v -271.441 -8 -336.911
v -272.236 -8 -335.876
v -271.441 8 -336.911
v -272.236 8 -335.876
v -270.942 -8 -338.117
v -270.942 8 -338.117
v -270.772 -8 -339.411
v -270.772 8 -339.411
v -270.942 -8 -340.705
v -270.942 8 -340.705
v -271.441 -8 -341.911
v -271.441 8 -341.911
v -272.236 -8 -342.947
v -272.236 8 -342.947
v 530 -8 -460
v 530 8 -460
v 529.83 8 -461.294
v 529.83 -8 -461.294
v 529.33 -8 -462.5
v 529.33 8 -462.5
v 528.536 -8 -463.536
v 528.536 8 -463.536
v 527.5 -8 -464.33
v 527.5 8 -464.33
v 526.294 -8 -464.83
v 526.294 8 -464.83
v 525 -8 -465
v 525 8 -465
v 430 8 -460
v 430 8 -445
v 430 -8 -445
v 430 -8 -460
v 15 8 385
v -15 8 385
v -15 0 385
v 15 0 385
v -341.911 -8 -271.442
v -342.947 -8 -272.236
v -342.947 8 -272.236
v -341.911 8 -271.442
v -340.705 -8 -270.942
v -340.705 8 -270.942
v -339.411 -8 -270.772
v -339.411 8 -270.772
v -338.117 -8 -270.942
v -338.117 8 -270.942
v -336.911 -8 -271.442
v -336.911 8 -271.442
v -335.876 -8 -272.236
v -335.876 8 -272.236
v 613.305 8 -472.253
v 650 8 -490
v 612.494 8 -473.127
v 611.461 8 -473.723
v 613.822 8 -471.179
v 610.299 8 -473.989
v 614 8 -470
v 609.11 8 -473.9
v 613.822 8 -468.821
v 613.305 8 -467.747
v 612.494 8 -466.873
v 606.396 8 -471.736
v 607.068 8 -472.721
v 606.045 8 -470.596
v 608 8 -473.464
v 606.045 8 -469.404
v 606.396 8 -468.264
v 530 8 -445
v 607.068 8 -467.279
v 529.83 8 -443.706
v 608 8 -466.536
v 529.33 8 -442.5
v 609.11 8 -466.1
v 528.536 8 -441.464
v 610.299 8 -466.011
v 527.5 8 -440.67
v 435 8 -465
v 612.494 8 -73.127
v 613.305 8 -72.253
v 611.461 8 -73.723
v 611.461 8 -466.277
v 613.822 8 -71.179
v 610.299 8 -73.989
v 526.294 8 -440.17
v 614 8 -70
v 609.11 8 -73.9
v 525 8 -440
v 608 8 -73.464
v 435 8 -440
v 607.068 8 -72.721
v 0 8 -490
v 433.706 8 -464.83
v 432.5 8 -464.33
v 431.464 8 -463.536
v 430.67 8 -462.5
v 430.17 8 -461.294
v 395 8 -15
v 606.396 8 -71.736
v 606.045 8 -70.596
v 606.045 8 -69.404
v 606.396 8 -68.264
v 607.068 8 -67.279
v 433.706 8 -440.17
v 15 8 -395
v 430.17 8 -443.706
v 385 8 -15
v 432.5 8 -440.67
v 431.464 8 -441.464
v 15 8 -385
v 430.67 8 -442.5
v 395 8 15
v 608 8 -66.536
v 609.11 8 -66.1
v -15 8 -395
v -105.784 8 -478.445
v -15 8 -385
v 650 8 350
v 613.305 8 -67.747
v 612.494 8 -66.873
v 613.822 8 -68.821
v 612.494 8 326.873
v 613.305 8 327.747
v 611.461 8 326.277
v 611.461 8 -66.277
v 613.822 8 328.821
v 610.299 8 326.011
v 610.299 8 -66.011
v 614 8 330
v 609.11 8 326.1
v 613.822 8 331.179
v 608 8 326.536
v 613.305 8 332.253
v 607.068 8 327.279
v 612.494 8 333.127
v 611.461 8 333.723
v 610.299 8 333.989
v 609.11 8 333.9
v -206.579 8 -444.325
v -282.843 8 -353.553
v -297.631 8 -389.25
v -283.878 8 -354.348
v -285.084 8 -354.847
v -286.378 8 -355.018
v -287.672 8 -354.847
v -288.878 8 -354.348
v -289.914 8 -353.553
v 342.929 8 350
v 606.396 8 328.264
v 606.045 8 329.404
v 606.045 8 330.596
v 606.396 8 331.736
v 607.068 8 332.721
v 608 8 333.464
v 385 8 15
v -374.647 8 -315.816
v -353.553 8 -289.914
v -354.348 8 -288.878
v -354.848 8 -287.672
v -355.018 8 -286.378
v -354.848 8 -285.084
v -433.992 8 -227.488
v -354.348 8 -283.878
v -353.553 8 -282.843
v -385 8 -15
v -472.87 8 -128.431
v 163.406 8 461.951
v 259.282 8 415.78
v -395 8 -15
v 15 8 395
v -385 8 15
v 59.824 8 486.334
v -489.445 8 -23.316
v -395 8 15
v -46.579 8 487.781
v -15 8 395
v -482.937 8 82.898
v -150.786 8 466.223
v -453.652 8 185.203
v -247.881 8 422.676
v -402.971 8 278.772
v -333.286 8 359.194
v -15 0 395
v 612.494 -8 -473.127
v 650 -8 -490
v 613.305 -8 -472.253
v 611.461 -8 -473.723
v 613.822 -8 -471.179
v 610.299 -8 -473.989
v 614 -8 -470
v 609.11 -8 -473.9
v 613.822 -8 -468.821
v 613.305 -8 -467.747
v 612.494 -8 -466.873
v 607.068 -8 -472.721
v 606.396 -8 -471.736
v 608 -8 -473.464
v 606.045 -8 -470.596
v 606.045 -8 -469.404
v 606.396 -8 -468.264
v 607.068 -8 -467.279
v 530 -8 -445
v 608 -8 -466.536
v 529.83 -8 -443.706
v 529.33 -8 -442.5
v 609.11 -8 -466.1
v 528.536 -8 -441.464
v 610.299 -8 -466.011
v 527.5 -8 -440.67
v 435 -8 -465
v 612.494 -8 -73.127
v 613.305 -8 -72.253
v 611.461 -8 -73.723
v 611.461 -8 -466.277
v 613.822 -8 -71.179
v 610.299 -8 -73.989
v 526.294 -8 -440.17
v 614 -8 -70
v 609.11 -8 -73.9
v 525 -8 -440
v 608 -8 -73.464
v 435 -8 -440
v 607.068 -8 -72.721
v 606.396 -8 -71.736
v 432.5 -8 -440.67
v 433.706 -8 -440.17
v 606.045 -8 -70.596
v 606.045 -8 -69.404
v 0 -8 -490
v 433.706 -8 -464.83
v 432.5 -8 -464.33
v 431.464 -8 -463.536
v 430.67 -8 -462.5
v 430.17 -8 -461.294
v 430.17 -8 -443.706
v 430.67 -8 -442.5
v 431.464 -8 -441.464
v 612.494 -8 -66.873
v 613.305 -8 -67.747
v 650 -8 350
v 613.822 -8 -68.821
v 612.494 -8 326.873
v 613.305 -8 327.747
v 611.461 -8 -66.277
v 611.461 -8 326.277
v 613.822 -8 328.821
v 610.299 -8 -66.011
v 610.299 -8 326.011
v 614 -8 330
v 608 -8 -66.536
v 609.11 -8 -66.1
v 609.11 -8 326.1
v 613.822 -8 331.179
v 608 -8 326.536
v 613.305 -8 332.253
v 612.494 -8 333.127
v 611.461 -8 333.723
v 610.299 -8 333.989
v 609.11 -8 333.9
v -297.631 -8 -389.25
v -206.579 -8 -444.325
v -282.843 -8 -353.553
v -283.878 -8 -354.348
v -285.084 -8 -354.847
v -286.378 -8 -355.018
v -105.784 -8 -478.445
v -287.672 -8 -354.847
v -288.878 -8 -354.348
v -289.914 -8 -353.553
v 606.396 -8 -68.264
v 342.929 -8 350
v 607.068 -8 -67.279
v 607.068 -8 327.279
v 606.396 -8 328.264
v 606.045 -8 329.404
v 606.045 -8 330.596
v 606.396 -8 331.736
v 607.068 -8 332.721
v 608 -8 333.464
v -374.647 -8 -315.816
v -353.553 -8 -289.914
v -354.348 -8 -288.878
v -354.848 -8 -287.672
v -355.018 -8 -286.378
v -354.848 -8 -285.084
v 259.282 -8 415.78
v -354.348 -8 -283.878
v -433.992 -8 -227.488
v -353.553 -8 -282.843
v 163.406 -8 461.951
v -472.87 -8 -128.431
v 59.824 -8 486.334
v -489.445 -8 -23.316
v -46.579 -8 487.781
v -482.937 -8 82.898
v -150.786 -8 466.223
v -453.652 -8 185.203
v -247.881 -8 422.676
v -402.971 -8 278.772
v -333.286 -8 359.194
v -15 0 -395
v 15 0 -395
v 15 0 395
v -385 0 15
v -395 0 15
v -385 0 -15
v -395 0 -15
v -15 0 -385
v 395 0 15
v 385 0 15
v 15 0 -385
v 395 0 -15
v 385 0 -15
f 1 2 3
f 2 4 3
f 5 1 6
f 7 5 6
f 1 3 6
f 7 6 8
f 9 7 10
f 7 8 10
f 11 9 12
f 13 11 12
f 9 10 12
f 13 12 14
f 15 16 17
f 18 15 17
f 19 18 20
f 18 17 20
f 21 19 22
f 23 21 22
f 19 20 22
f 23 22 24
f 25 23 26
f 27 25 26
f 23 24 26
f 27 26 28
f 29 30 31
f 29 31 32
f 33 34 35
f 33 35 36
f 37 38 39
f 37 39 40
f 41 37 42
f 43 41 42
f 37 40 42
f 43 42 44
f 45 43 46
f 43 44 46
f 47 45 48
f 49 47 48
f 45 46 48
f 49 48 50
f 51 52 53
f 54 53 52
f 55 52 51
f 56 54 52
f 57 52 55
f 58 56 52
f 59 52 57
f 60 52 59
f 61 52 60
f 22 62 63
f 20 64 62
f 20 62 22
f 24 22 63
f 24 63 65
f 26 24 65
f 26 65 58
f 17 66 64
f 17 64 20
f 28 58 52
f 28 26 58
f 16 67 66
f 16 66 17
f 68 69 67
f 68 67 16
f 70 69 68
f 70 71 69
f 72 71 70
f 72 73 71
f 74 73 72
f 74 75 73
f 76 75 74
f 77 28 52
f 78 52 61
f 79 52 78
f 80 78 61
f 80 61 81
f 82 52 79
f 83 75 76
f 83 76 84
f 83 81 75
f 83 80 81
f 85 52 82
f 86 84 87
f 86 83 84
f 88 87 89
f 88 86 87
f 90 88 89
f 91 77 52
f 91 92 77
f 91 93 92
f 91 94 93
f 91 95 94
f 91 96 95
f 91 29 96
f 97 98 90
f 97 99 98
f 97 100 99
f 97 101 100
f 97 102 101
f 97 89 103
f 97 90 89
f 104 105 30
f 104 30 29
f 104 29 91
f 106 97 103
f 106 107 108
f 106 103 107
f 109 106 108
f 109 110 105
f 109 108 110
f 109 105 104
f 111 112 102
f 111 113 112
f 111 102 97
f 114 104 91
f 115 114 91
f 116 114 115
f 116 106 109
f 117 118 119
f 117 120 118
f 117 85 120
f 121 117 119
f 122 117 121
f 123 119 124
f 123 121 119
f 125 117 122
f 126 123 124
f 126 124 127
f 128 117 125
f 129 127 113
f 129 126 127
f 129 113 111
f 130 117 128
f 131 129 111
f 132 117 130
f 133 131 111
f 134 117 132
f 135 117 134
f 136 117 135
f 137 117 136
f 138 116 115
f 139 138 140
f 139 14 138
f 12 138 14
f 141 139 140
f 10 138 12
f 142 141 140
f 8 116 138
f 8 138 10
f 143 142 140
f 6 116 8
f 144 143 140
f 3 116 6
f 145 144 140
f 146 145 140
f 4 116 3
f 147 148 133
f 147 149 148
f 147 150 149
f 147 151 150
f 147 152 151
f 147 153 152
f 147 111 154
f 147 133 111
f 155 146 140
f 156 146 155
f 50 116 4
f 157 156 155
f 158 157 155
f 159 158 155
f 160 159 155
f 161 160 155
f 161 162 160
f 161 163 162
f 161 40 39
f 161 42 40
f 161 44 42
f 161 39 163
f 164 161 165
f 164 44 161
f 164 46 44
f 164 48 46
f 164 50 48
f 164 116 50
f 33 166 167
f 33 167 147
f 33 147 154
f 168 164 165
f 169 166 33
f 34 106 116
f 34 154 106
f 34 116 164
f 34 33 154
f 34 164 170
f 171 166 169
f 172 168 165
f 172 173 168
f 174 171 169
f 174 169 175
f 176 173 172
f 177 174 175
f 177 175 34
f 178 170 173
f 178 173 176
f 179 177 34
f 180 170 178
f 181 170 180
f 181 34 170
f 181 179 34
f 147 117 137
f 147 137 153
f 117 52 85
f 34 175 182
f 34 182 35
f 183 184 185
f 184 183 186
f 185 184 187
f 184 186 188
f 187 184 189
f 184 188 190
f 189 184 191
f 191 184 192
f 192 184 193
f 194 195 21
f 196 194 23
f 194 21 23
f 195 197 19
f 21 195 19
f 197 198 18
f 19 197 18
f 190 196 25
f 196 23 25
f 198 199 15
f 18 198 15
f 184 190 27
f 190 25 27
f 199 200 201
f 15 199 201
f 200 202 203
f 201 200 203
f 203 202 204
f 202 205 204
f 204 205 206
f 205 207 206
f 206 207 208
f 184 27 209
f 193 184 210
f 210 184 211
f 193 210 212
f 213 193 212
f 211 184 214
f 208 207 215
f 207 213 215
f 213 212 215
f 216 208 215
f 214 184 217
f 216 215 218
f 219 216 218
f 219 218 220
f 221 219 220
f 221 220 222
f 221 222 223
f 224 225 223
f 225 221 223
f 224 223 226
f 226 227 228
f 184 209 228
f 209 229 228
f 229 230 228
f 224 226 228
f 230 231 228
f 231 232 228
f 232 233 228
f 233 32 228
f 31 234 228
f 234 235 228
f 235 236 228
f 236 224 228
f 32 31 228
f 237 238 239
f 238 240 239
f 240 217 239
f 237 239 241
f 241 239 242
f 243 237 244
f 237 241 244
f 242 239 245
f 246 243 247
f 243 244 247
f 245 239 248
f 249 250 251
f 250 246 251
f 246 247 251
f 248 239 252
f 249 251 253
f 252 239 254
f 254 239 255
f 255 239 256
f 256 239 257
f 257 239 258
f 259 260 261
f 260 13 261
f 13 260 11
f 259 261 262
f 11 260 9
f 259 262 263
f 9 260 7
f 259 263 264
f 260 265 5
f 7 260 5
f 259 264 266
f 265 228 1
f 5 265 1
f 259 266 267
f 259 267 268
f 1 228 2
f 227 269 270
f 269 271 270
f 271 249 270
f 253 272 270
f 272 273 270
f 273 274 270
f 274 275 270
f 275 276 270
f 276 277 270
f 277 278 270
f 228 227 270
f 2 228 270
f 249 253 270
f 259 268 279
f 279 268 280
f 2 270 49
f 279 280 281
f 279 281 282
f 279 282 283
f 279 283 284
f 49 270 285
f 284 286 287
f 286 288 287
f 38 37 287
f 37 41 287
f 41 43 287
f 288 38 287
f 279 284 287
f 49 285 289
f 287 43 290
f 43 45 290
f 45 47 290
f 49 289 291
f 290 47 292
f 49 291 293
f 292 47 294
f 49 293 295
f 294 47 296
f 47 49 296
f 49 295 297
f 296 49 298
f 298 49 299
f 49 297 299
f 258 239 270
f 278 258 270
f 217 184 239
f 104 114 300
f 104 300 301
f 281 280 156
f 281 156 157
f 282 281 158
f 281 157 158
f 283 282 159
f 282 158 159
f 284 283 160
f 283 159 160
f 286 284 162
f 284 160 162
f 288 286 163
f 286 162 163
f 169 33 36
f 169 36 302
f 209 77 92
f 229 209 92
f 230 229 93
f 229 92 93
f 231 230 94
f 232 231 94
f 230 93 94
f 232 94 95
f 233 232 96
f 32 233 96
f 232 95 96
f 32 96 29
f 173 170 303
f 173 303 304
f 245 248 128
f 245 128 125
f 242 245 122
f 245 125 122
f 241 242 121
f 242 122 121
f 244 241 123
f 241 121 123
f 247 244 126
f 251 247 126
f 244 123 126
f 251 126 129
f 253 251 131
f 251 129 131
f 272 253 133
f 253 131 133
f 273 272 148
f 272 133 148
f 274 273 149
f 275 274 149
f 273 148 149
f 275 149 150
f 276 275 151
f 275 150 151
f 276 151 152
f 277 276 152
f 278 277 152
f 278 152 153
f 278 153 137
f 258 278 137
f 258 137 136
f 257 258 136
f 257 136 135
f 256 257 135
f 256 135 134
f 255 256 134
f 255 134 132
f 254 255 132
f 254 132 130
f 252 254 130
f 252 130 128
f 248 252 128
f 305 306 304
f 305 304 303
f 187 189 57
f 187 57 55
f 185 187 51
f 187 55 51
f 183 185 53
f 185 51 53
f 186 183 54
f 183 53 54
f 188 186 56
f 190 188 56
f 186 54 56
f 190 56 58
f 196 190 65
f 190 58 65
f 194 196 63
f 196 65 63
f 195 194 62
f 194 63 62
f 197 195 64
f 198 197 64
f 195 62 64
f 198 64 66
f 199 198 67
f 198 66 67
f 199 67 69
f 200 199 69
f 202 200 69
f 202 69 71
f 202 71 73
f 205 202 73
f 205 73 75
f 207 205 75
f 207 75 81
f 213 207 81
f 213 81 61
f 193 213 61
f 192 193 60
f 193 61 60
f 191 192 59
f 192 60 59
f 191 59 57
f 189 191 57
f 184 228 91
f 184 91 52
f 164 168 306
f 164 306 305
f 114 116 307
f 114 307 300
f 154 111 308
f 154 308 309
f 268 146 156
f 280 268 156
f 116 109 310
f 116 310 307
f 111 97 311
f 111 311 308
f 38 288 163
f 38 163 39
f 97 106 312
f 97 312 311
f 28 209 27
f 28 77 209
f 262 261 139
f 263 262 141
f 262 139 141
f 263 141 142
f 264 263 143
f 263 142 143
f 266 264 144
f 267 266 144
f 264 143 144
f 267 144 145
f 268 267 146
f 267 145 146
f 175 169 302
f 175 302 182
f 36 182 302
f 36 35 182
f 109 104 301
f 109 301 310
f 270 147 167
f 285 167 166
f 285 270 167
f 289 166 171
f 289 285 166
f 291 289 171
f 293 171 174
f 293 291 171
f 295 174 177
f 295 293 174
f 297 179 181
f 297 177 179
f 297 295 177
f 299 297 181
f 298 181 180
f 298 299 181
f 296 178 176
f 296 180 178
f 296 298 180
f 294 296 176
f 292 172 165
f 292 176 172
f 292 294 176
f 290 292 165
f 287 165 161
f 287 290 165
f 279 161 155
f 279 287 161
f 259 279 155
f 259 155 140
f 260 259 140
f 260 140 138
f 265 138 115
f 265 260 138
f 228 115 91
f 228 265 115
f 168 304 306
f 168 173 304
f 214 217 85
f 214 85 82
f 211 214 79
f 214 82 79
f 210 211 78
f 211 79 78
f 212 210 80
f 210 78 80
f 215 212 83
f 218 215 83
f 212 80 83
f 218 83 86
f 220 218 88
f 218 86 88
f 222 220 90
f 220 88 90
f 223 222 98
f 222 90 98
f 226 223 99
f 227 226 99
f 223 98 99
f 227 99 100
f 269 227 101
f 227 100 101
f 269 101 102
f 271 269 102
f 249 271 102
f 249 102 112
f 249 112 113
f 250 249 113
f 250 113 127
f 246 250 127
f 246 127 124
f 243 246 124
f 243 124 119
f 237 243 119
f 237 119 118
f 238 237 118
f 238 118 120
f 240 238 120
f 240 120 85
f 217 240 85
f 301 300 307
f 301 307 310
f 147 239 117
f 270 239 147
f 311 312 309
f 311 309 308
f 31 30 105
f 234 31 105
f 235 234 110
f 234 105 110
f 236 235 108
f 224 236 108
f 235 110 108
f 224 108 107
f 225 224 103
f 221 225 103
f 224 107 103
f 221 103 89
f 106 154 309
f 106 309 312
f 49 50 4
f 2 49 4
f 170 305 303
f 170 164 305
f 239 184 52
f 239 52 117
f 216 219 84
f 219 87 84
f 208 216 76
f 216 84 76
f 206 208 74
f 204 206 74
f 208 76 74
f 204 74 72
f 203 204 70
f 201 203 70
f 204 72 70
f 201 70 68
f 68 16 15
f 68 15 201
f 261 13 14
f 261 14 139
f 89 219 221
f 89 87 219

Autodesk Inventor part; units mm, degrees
ref_plane "YZ Plane" through (0, 0, 0) normal (1, 0, 0) x (0, 1, 0)
ref_plane "XZ Plane" through (0, 0, 0) normal (0, 1, 0) x (-1, 0, 0)
ref_plane "XY Plane" through (0, 0, 0) normal (0, 0, 1) x (1, 0, 0)
sketch "Sketch1" plane through (0, 0, 0) normal (0, 1, 0) x (-1, 0, 0)
  arc A0 (0, -490) -> (-342.9286, 350) centre (0, 0) ccw
  line L0 (0, -490) -> (-650, -490)
  line L1 (-650, -490) -> (-650, 350)
  line L2 (-650, 350) -> (-342.9286, 350)
  dimension "d1" = 980
  dimension "d2" = 350
  dimension "d3" = 650
extrude "Extrusion1" add sketch "Sketch1" along normal mid plane 16
sketch "Sketch2" plane through (0, 8, 0) normal (0, 1, 0) x (1, 0, 0)
  arc A0 (0, 490) -> (342.9286, -350) centre (0, 0) ccw projected
  line L0 (650, -350) -> (650, 490) projected
  line L1 (650, 490) -> (0, 490) projected
  line L2 (435, 465) -> (525, 465)
  line L3 (530, 460) -> (530, 445)
  line L4 (525, 440) -> (435, 440)
  line L5 (430, 445) -> (430, 460)
  arc A1 (435, 465) -> (430, 460) centre (435, 460) ccw
  arc A2 (430, 445) -> (435, 440) centre (435, 445) ccw
  arc A3 (525, 440) -> (530, 445) centre (525, 445) ccw
  arc A4 (530, 460) -> (525, 465) centre (525, 460) ccw
  line L6 (0, 0) -> (-346.4823, 346.4823) construction
  line L7 (-289.9138, 353.5534) -> (-353.5534, 289.9138)
  line L8 (-353.5534, 282.8427) -> (-342.9468, 272.2361)
  line L9 (-335.8757, 272.2361) -> (-272.2361, 335.8757)
  line L10 (-272.2361, 342.9468) -> (-282.8427, 353.5534)
  arc A5 (-353.5534, 289.9138) -> (-353.5534, 282.8427) centre (-350.0179, 286.3782) ccw
  arc A6 (-342.9468, 272.2361) -> (-335.8757, 272.2361) centre (-339.4113, 275.7716) ccw
  arc A7 (-272.2361, 335.8757) -> (-272.2361, 342.9468) centre (-275.7716, 339.4113) ccw
  arc A8 (-282.8427, 353.5534) -> (-289.9138, 353.5534) centre (-286.3782, 350.0179) ccw
  point P0 (430, 465)
  point P1 (530, 465)
  point P2 (430, 440)
  dimension "d6" = 100
  dimension "d7" = 25
  dimension "d8" = 25
  dimension "d9" = 120
  dimension "d10" = 5
  dimension "d11" = 45
  dimension "d15" = 25
  dimension "d16" = 100
  dimension "d17" = 430
  dimension "d18" = 90
  dimension "d19" = 5
extrude "Extrusion2" cut sketch "Sketch2" against normal through all
sketch "Sketch3" plane through (0, 8, 0) normal (0, 1, 0) x (1, 0, 0)
  circle A0 centre (610, 470) radius 4
  circle A1 centre (610, -330) radius 4
  circle A2 centre (610, 70) radius 4
  circle A3 centre (610, 470) radius 2.75 projected
  circle A4 centre (610, 70) radius 2.75 projected
  circle A5 centre (610, -330) radius 2.75 projected
  dimension "d22" = 8
extrude "Extrusion3" cut sketch "Sketch3" against normal through all contours A0 | A1 | A2 | A3 | A4 | A5
ref_plane "Work Plane1" through (0, 0, 0) normal (-0.7071, 0, -0.7071) x (-0.7071, 0, 0.7071)
ref_plane "Work Plane2" through (500, 8, 350) normal (1, 0, 0) x (0, 0, -1)
ref_plane "Work Plane3" through (342.9286, 8, 180) normal (0, 0, 1) x (1, 0, 0)
sketch "Sketch4" plane through (0, 8, 0) normal (0, 1, 0) x (1, 0, 0)
  arc A0 (0, 490) -> (342.9286, -350) centre (0, 0) ccw projected
  line L0 (-380, -100) -> (-380, 100) construction
  line L1 (-100, 380) -> (100, 380) construction
  line L2 (380, 100) -> (380, -100) construction
  line L3 (100, -380) -> (-100, -380) construction
  line L4 (-15, -385) -> (15, -385)
  line L5 (15, -385) -> (15, -395)
  line L6 (15, -395) -> (-15, -395)
  line L7 (-15, -395) -> (-15, -385)
  line L8 (-395, 15) -> (-385, 15)
  line L9 (-385, 15) -> (-385, -15)
  line L10 (-385, -15) -> (-395, -15)
  line L11 (-395, -15) -> (-395, 15)
  line L12 (-15, 395) -> (15, 395)
  line L13 (15, 395) -> (15, 385)
  line L14 (15, 385) -> (-15, 385)
  line L15 (-15, 385) -> (-15, 395)
  line L16 (385, 15) -> (395, 15)
  line L17 (395, 15) -> (395, -15)
  line L18 (395, -15) -> (385, -15)
  line L19 (385, -15) -> (385, 15)
  line L20 (0, 0) -> (-490, 0) construction
  line L21 (0, 0) -> (0, 490) construction
  dimension "d27" = 5
  dimension "d28" = 5
  dimension "d29" = 10
  dimension "d30" = 30
extrude "Extrusion4" cut sketch "Sketch4" against normal blind 8
properties part number "Base_Left" material "MDF Medium Density Fiberboard"
